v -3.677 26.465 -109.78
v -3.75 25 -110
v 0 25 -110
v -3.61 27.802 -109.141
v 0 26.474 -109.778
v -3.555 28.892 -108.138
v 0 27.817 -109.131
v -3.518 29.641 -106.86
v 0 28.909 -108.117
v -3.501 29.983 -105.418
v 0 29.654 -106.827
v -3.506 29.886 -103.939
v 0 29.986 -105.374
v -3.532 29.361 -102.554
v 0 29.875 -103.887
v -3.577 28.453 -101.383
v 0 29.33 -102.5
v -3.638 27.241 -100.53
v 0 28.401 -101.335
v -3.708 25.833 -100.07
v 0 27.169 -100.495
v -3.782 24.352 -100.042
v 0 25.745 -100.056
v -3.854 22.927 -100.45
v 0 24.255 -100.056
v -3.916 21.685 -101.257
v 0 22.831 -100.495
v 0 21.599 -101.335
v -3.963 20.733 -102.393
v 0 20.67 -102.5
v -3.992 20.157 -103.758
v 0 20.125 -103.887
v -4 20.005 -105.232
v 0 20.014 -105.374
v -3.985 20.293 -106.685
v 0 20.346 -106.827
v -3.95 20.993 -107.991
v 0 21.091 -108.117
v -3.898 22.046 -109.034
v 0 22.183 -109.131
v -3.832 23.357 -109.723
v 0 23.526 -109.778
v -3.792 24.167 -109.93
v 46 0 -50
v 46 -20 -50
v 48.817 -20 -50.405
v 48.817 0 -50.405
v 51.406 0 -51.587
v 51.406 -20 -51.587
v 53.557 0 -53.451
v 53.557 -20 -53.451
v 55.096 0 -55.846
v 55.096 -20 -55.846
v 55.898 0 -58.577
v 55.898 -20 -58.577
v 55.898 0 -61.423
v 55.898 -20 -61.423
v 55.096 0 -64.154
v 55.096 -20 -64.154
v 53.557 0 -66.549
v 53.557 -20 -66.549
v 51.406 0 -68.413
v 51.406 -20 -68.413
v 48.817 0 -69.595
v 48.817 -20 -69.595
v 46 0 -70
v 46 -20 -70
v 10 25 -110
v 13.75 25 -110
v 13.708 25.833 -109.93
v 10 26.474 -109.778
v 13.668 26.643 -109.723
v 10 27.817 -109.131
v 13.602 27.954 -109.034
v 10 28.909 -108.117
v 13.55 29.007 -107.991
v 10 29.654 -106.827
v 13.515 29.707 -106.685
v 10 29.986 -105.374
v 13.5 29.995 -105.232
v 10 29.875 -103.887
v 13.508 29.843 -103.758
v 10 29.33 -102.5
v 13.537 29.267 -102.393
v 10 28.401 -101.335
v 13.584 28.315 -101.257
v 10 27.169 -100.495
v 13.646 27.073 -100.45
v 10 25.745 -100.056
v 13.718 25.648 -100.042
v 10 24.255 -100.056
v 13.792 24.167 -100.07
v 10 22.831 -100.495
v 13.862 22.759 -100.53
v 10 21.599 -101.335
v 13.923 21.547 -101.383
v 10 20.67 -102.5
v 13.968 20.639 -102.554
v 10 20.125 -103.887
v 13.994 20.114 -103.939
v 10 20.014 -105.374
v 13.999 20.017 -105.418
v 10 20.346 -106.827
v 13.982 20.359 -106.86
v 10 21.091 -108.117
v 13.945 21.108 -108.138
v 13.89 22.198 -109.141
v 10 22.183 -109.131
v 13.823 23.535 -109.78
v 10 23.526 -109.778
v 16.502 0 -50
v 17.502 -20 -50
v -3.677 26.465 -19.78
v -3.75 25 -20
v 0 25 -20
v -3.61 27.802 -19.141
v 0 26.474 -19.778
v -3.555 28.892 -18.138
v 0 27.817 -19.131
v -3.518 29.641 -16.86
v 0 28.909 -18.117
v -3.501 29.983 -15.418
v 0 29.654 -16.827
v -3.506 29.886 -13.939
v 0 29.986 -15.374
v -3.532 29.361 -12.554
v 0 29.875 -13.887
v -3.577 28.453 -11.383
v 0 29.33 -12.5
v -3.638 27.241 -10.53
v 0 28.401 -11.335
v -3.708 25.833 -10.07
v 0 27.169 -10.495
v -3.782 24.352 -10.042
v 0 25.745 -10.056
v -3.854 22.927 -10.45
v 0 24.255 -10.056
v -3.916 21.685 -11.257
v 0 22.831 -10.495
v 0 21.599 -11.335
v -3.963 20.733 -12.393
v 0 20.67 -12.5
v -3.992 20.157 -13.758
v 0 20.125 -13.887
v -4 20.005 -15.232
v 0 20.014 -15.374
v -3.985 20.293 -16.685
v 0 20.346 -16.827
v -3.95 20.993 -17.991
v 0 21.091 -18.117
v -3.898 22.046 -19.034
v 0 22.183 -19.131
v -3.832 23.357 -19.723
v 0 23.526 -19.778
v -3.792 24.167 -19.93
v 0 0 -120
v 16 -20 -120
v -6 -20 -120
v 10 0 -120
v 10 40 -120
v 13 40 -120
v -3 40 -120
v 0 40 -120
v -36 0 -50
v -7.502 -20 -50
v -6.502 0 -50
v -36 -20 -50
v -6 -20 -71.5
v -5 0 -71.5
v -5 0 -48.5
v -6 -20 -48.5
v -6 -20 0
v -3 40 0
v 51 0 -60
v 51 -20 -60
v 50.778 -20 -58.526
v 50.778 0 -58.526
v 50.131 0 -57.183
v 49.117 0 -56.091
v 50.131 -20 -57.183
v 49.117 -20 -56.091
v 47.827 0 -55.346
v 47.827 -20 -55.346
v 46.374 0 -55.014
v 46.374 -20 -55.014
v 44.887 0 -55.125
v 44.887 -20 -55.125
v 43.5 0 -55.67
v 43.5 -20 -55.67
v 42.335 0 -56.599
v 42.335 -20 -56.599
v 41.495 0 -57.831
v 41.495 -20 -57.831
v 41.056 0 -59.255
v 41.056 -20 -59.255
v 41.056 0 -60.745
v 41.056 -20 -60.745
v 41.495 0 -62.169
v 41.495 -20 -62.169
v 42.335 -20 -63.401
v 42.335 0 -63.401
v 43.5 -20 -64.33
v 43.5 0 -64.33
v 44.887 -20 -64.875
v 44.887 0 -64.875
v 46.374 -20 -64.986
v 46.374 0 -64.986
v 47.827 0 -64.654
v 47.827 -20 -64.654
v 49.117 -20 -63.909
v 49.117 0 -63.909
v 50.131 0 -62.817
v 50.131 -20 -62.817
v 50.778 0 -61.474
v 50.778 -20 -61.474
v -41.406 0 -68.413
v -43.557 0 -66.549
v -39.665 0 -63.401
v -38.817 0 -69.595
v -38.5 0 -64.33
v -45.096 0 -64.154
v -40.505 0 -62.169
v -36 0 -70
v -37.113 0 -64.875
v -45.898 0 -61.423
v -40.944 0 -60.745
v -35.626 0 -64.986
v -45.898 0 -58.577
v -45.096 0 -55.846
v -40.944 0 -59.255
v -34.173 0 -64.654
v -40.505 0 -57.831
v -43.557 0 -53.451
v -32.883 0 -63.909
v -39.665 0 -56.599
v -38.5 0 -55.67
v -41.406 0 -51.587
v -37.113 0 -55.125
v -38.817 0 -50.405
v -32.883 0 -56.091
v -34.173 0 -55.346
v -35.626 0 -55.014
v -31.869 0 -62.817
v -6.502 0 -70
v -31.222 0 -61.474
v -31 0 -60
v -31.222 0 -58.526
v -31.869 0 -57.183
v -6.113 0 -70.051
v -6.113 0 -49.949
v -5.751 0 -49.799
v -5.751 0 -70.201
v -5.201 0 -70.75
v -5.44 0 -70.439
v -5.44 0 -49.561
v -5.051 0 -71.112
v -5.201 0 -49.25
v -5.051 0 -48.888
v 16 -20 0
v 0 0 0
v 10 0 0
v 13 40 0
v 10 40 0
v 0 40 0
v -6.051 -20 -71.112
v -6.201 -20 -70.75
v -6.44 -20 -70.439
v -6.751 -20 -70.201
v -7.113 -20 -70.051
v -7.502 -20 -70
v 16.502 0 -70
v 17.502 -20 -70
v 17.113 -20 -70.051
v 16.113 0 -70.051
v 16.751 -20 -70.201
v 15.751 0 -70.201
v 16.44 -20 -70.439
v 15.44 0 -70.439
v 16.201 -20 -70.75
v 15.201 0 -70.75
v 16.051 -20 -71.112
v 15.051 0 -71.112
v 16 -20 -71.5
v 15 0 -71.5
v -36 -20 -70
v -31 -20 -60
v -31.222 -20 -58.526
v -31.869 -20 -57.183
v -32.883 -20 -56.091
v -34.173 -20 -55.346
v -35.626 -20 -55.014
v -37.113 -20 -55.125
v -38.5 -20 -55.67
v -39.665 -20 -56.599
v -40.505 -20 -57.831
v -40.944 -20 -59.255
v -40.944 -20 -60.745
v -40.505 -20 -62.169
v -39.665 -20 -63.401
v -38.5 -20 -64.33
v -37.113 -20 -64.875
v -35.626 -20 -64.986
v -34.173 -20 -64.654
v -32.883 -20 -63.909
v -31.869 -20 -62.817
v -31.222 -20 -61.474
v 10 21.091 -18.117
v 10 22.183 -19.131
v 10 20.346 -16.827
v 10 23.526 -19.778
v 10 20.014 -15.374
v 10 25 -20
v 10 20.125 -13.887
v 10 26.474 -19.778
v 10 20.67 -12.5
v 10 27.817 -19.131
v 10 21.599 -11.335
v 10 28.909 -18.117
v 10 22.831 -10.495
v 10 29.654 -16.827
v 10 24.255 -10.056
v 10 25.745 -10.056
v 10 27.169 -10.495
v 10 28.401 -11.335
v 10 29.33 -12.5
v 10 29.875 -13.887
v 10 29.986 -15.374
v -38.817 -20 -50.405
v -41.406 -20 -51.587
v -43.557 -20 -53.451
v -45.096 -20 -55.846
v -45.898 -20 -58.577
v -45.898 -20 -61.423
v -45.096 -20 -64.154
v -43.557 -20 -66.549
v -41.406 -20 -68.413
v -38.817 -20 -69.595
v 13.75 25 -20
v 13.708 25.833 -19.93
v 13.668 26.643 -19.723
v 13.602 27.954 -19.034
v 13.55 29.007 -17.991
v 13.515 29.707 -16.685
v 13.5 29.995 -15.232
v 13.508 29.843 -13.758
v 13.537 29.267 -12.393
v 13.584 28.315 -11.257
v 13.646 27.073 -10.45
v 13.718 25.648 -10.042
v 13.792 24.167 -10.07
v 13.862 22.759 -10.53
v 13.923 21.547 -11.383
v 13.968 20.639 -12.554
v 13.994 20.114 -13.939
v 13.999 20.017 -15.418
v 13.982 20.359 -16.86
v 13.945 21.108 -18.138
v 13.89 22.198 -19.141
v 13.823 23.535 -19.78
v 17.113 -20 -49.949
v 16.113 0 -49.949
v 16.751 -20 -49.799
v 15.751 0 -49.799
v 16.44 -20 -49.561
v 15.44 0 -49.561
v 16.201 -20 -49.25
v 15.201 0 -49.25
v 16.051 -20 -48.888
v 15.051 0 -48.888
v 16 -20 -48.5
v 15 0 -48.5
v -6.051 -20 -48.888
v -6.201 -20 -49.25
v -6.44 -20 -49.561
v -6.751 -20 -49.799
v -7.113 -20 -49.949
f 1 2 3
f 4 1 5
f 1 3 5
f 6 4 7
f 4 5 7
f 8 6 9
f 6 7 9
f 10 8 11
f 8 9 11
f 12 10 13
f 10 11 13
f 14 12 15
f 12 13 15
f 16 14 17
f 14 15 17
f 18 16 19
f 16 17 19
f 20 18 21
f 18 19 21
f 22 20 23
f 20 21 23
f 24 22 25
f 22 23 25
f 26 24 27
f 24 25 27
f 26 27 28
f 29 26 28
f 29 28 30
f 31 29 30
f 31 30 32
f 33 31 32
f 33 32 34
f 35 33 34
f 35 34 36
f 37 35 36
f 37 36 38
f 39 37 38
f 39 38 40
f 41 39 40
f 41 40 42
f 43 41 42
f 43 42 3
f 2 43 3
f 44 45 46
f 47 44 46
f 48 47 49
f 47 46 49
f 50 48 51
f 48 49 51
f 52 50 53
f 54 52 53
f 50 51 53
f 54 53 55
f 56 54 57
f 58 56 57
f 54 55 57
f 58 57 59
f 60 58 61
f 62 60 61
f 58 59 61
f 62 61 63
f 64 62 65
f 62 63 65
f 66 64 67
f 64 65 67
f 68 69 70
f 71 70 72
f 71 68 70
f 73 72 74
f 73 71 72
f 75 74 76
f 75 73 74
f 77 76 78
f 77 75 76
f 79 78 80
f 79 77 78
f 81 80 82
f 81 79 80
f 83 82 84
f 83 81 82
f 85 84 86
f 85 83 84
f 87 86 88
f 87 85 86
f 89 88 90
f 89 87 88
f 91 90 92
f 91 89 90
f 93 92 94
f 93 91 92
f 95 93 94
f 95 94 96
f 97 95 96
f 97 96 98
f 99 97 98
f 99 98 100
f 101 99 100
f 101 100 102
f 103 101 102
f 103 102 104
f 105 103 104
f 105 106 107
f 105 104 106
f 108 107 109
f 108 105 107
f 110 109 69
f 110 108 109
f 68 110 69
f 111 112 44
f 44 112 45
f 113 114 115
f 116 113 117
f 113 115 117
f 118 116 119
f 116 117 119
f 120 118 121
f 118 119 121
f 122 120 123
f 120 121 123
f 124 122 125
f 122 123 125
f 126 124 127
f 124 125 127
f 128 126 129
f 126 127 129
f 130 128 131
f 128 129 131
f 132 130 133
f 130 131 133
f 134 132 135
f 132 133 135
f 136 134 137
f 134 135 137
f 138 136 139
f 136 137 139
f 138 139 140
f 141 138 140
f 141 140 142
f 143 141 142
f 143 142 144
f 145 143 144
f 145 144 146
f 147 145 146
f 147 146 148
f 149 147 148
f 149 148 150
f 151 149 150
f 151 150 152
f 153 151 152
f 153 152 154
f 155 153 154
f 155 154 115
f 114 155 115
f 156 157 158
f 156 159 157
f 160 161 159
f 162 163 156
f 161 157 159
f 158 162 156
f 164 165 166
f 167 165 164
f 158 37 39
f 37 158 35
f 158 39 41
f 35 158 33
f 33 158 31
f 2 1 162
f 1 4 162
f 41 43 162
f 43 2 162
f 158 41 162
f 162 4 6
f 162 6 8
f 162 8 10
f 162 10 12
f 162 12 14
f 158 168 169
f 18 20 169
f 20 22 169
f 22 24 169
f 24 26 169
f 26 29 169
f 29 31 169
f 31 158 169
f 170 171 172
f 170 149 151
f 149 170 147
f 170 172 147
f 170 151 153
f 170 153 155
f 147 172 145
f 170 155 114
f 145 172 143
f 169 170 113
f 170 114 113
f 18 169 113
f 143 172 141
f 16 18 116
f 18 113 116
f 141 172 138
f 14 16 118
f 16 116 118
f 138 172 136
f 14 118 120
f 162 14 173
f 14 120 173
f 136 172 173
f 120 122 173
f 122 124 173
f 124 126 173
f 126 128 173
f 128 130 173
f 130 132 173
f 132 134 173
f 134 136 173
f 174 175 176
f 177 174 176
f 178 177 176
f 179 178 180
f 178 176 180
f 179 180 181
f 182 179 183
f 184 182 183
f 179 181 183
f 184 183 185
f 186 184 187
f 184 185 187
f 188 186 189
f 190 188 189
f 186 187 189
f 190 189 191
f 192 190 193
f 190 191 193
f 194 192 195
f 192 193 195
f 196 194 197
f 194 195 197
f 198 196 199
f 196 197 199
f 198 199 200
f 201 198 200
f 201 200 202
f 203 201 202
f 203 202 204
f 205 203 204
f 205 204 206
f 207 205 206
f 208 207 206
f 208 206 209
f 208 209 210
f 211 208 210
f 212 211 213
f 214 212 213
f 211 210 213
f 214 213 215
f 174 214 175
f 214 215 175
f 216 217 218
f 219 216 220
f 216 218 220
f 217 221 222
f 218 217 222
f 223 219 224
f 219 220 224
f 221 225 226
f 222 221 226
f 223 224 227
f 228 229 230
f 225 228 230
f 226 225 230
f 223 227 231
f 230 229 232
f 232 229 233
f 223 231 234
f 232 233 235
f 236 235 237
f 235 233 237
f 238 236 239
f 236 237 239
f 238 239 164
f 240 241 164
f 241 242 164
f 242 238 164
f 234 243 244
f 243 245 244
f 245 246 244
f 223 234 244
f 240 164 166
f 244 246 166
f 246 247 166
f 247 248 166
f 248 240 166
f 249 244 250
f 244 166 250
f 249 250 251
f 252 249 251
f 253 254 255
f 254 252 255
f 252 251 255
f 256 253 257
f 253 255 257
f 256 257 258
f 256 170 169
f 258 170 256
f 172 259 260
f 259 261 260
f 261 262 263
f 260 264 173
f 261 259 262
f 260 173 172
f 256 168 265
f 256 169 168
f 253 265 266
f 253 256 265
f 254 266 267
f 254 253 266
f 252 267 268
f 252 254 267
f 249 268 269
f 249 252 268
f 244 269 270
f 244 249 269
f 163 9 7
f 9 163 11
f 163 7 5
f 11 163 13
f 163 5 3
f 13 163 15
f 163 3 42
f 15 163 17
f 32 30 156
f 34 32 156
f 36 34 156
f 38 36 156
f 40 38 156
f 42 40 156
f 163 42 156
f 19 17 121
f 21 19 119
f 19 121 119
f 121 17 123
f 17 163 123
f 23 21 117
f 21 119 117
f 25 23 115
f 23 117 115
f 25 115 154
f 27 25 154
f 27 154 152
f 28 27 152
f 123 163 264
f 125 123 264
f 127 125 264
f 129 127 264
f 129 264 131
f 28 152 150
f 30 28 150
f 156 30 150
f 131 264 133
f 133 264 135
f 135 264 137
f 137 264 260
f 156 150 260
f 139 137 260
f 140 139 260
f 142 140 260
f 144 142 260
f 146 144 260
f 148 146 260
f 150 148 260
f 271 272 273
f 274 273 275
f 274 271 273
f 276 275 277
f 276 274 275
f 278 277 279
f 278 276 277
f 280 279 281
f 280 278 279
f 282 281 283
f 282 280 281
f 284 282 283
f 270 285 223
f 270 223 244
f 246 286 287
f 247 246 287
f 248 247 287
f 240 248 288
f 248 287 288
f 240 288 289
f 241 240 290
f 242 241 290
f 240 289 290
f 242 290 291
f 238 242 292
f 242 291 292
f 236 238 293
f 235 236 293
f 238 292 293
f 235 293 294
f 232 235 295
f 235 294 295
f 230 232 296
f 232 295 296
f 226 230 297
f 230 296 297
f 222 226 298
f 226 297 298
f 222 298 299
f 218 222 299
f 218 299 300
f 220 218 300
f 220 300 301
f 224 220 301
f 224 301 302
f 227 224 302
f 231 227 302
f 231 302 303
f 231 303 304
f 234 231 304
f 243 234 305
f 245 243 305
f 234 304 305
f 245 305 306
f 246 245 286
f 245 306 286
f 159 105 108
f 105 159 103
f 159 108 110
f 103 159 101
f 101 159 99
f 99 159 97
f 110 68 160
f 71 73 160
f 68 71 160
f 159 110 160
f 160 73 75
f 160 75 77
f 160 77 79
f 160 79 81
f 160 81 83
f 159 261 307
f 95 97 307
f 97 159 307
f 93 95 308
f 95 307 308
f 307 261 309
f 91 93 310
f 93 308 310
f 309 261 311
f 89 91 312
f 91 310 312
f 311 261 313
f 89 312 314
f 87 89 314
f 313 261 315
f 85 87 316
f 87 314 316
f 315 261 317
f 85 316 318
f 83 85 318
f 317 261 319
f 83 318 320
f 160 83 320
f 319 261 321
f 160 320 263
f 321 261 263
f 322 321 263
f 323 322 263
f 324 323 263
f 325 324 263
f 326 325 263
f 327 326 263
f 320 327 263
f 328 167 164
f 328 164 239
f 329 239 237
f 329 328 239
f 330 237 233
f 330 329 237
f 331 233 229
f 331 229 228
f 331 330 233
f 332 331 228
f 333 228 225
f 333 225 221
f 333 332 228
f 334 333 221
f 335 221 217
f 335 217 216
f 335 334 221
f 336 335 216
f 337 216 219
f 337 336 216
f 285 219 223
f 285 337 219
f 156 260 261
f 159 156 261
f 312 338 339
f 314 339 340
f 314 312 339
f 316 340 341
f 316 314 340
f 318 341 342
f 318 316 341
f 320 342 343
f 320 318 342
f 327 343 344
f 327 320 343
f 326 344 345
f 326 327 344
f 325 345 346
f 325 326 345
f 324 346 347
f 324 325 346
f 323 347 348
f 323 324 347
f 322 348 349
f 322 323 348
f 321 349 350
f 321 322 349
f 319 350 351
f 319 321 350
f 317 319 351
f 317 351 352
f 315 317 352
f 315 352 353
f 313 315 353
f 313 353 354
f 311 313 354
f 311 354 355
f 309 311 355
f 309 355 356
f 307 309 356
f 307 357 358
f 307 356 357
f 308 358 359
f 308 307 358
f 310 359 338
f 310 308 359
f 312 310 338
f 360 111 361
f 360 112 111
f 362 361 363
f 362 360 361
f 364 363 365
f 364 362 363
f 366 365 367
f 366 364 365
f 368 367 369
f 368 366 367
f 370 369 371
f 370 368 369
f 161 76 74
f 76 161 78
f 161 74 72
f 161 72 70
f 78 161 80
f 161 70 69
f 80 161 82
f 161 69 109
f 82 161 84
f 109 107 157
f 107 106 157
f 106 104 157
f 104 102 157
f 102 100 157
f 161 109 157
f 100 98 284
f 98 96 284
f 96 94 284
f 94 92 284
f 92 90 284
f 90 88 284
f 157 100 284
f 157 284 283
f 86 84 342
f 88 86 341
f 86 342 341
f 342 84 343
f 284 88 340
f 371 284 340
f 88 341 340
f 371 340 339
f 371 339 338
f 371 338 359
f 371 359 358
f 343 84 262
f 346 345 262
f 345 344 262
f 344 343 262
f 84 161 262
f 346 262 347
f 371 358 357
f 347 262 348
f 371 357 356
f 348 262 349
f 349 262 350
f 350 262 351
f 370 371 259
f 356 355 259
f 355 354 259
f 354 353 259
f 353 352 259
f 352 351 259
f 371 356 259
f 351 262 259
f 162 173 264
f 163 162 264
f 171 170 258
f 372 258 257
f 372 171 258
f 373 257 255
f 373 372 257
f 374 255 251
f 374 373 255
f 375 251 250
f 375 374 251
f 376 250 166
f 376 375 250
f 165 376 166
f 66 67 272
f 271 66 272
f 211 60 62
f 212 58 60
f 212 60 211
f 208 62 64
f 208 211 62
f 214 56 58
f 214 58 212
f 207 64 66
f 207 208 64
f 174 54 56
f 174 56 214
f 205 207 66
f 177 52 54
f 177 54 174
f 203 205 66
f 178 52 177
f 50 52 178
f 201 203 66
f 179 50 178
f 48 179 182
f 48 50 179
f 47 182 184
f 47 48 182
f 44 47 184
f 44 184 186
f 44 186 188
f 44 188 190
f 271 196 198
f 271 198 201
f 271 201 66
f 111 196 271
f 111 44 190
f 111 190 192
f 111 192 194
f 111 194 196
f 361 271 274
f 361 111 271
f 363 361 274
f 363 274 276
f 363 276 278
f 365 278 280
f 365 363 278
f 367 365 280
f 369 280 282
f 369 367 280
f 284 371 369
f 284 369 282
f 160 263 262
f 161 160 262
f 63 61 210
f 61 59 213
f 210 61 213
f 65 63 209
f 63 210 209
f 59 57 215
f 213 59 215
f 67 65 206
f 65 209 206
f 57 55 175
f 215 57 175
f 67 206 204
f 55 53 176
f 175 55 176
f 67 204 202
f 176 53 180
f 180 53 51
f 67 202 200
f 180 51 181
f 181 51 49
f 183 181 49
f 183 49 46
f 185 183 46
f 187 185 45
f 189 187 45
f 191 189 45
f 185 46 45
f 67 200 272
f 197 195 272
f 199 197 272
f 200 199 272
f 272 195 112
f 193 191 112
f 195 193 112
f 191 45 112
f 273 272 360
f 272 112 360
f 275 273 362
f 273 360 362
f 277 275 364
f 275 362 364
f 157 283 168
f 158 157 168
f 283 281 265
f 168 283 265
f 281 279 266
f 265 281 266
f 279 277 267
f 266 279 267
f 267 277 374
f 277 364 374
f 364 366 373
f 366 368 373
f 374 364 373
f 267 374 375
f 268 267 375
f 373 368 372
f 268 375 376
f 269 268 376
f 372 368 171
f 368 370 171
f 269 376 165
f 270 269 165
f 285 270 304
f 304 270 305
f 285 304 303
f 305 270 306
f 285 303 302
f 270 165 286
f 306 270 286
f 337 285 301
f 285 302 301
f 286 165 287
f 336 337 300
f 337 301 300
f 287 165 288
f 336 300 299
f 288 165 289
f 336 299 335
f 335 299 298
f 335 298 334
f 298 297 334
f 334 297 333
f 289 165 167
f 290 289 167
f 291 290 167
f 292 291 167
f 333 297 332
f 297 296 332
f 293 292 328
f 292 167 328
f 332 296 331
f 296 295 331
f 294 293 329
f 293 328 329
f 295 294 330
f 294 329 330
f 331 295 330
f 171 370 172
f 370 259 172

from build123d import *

# Parameters (mm, degrees)
BOSS_EXTRUDE1_DEPTH     = 120
SKETCH5_R               = 5
BOSS_EXTRUDE2_DEPTH     = 20
FILLET1_R               = 1.5
SKETCH7_R               = 5
CUT_EXTRUDE1_DEPTH      = 57
CUT_EXTRUDE1_DEPTH_BACK = 47


with BuildPart() as part:
    # Sketch2 → Boss-Extrude1 (new body)
    with BuildSketch(Plane.XY):
        Polygon((0, 0), (10, 0), (10, 40), (13, 40), (16, -20), (-6, -20), (-3, 40), (0, 40), align=None)
    extrude(amount=-BOSS_EXTRUDE1_DEPTH)

    # Sketch5 → Boss-Extrude2 (add)
    with BuildSketch(Plane.XZ.offset(20)):
        with BuildLine():
            Line((16, -50), (46, -50))
            ThreePointArc((46, -50), (56, -60), (46, -70))
            Line((46, -70), (16, -70))
            Line((16, -70), (13, -70))
            Line((13, -70), (13, -50))
            Line((13, -50), (16, -50))
        make_face()
        with Locations((46, -60)):
            Circle(SKETCH5_R, mode=Mode.SUBTRACT)
        with BuildLine():
            Line((-6, -50), (-36, -50))
            ThreePointArc((-36, -50), (-46, -60), (-36, -70))
            Line((-36, -70), (-6, -70))
            Line((-6, -70), (-3, -70))
            Line((-3, -70), (-3, -50))
            Line((-3, -50), (-6, -50))
        make_face()
        with Locations((-36, -60)):
            Circle(SKETCH5_R, mode=Mode.SUBTRACT)
    extrude(amount=-BOSS_EXTRUDE2_DEPTH)

    # Fillet1
    fillet1_edges = [part.edges().sort_by_distance(p)[0] for p in [
        (15.5, -10, -50),
        (15.5, -10, -70),
        (-5.5, -10, -50),
        (-5.5, -10, -70),
    ]]
    fillet(fillet1_edges, radius=FILLET1_R)

    # Sketch7 → Cut-Extrude1 (cut, two sides)
    with BuildSketch(Plane(origin=(0, 0, 0), x_dir=(0, 0, -1), z_dir=(1, 0, 0))) as cut_extrude1_sk:
        with Locations((15, 25)):
            Circle(SKETCH7_R)
        with Locations((105, 25)):
            Circle(SKETCH7_R)
    extrude(amount=CUT_EXTRUDE1_DEPTH, mode=Mode.SUBTRACT)
    extrude(cut_extrude1_sk.sketch, amount=-CUT_EXTRUDE1_DEPTH_BACK, mode=Mode.SUBTRACT)


solid = part.part
